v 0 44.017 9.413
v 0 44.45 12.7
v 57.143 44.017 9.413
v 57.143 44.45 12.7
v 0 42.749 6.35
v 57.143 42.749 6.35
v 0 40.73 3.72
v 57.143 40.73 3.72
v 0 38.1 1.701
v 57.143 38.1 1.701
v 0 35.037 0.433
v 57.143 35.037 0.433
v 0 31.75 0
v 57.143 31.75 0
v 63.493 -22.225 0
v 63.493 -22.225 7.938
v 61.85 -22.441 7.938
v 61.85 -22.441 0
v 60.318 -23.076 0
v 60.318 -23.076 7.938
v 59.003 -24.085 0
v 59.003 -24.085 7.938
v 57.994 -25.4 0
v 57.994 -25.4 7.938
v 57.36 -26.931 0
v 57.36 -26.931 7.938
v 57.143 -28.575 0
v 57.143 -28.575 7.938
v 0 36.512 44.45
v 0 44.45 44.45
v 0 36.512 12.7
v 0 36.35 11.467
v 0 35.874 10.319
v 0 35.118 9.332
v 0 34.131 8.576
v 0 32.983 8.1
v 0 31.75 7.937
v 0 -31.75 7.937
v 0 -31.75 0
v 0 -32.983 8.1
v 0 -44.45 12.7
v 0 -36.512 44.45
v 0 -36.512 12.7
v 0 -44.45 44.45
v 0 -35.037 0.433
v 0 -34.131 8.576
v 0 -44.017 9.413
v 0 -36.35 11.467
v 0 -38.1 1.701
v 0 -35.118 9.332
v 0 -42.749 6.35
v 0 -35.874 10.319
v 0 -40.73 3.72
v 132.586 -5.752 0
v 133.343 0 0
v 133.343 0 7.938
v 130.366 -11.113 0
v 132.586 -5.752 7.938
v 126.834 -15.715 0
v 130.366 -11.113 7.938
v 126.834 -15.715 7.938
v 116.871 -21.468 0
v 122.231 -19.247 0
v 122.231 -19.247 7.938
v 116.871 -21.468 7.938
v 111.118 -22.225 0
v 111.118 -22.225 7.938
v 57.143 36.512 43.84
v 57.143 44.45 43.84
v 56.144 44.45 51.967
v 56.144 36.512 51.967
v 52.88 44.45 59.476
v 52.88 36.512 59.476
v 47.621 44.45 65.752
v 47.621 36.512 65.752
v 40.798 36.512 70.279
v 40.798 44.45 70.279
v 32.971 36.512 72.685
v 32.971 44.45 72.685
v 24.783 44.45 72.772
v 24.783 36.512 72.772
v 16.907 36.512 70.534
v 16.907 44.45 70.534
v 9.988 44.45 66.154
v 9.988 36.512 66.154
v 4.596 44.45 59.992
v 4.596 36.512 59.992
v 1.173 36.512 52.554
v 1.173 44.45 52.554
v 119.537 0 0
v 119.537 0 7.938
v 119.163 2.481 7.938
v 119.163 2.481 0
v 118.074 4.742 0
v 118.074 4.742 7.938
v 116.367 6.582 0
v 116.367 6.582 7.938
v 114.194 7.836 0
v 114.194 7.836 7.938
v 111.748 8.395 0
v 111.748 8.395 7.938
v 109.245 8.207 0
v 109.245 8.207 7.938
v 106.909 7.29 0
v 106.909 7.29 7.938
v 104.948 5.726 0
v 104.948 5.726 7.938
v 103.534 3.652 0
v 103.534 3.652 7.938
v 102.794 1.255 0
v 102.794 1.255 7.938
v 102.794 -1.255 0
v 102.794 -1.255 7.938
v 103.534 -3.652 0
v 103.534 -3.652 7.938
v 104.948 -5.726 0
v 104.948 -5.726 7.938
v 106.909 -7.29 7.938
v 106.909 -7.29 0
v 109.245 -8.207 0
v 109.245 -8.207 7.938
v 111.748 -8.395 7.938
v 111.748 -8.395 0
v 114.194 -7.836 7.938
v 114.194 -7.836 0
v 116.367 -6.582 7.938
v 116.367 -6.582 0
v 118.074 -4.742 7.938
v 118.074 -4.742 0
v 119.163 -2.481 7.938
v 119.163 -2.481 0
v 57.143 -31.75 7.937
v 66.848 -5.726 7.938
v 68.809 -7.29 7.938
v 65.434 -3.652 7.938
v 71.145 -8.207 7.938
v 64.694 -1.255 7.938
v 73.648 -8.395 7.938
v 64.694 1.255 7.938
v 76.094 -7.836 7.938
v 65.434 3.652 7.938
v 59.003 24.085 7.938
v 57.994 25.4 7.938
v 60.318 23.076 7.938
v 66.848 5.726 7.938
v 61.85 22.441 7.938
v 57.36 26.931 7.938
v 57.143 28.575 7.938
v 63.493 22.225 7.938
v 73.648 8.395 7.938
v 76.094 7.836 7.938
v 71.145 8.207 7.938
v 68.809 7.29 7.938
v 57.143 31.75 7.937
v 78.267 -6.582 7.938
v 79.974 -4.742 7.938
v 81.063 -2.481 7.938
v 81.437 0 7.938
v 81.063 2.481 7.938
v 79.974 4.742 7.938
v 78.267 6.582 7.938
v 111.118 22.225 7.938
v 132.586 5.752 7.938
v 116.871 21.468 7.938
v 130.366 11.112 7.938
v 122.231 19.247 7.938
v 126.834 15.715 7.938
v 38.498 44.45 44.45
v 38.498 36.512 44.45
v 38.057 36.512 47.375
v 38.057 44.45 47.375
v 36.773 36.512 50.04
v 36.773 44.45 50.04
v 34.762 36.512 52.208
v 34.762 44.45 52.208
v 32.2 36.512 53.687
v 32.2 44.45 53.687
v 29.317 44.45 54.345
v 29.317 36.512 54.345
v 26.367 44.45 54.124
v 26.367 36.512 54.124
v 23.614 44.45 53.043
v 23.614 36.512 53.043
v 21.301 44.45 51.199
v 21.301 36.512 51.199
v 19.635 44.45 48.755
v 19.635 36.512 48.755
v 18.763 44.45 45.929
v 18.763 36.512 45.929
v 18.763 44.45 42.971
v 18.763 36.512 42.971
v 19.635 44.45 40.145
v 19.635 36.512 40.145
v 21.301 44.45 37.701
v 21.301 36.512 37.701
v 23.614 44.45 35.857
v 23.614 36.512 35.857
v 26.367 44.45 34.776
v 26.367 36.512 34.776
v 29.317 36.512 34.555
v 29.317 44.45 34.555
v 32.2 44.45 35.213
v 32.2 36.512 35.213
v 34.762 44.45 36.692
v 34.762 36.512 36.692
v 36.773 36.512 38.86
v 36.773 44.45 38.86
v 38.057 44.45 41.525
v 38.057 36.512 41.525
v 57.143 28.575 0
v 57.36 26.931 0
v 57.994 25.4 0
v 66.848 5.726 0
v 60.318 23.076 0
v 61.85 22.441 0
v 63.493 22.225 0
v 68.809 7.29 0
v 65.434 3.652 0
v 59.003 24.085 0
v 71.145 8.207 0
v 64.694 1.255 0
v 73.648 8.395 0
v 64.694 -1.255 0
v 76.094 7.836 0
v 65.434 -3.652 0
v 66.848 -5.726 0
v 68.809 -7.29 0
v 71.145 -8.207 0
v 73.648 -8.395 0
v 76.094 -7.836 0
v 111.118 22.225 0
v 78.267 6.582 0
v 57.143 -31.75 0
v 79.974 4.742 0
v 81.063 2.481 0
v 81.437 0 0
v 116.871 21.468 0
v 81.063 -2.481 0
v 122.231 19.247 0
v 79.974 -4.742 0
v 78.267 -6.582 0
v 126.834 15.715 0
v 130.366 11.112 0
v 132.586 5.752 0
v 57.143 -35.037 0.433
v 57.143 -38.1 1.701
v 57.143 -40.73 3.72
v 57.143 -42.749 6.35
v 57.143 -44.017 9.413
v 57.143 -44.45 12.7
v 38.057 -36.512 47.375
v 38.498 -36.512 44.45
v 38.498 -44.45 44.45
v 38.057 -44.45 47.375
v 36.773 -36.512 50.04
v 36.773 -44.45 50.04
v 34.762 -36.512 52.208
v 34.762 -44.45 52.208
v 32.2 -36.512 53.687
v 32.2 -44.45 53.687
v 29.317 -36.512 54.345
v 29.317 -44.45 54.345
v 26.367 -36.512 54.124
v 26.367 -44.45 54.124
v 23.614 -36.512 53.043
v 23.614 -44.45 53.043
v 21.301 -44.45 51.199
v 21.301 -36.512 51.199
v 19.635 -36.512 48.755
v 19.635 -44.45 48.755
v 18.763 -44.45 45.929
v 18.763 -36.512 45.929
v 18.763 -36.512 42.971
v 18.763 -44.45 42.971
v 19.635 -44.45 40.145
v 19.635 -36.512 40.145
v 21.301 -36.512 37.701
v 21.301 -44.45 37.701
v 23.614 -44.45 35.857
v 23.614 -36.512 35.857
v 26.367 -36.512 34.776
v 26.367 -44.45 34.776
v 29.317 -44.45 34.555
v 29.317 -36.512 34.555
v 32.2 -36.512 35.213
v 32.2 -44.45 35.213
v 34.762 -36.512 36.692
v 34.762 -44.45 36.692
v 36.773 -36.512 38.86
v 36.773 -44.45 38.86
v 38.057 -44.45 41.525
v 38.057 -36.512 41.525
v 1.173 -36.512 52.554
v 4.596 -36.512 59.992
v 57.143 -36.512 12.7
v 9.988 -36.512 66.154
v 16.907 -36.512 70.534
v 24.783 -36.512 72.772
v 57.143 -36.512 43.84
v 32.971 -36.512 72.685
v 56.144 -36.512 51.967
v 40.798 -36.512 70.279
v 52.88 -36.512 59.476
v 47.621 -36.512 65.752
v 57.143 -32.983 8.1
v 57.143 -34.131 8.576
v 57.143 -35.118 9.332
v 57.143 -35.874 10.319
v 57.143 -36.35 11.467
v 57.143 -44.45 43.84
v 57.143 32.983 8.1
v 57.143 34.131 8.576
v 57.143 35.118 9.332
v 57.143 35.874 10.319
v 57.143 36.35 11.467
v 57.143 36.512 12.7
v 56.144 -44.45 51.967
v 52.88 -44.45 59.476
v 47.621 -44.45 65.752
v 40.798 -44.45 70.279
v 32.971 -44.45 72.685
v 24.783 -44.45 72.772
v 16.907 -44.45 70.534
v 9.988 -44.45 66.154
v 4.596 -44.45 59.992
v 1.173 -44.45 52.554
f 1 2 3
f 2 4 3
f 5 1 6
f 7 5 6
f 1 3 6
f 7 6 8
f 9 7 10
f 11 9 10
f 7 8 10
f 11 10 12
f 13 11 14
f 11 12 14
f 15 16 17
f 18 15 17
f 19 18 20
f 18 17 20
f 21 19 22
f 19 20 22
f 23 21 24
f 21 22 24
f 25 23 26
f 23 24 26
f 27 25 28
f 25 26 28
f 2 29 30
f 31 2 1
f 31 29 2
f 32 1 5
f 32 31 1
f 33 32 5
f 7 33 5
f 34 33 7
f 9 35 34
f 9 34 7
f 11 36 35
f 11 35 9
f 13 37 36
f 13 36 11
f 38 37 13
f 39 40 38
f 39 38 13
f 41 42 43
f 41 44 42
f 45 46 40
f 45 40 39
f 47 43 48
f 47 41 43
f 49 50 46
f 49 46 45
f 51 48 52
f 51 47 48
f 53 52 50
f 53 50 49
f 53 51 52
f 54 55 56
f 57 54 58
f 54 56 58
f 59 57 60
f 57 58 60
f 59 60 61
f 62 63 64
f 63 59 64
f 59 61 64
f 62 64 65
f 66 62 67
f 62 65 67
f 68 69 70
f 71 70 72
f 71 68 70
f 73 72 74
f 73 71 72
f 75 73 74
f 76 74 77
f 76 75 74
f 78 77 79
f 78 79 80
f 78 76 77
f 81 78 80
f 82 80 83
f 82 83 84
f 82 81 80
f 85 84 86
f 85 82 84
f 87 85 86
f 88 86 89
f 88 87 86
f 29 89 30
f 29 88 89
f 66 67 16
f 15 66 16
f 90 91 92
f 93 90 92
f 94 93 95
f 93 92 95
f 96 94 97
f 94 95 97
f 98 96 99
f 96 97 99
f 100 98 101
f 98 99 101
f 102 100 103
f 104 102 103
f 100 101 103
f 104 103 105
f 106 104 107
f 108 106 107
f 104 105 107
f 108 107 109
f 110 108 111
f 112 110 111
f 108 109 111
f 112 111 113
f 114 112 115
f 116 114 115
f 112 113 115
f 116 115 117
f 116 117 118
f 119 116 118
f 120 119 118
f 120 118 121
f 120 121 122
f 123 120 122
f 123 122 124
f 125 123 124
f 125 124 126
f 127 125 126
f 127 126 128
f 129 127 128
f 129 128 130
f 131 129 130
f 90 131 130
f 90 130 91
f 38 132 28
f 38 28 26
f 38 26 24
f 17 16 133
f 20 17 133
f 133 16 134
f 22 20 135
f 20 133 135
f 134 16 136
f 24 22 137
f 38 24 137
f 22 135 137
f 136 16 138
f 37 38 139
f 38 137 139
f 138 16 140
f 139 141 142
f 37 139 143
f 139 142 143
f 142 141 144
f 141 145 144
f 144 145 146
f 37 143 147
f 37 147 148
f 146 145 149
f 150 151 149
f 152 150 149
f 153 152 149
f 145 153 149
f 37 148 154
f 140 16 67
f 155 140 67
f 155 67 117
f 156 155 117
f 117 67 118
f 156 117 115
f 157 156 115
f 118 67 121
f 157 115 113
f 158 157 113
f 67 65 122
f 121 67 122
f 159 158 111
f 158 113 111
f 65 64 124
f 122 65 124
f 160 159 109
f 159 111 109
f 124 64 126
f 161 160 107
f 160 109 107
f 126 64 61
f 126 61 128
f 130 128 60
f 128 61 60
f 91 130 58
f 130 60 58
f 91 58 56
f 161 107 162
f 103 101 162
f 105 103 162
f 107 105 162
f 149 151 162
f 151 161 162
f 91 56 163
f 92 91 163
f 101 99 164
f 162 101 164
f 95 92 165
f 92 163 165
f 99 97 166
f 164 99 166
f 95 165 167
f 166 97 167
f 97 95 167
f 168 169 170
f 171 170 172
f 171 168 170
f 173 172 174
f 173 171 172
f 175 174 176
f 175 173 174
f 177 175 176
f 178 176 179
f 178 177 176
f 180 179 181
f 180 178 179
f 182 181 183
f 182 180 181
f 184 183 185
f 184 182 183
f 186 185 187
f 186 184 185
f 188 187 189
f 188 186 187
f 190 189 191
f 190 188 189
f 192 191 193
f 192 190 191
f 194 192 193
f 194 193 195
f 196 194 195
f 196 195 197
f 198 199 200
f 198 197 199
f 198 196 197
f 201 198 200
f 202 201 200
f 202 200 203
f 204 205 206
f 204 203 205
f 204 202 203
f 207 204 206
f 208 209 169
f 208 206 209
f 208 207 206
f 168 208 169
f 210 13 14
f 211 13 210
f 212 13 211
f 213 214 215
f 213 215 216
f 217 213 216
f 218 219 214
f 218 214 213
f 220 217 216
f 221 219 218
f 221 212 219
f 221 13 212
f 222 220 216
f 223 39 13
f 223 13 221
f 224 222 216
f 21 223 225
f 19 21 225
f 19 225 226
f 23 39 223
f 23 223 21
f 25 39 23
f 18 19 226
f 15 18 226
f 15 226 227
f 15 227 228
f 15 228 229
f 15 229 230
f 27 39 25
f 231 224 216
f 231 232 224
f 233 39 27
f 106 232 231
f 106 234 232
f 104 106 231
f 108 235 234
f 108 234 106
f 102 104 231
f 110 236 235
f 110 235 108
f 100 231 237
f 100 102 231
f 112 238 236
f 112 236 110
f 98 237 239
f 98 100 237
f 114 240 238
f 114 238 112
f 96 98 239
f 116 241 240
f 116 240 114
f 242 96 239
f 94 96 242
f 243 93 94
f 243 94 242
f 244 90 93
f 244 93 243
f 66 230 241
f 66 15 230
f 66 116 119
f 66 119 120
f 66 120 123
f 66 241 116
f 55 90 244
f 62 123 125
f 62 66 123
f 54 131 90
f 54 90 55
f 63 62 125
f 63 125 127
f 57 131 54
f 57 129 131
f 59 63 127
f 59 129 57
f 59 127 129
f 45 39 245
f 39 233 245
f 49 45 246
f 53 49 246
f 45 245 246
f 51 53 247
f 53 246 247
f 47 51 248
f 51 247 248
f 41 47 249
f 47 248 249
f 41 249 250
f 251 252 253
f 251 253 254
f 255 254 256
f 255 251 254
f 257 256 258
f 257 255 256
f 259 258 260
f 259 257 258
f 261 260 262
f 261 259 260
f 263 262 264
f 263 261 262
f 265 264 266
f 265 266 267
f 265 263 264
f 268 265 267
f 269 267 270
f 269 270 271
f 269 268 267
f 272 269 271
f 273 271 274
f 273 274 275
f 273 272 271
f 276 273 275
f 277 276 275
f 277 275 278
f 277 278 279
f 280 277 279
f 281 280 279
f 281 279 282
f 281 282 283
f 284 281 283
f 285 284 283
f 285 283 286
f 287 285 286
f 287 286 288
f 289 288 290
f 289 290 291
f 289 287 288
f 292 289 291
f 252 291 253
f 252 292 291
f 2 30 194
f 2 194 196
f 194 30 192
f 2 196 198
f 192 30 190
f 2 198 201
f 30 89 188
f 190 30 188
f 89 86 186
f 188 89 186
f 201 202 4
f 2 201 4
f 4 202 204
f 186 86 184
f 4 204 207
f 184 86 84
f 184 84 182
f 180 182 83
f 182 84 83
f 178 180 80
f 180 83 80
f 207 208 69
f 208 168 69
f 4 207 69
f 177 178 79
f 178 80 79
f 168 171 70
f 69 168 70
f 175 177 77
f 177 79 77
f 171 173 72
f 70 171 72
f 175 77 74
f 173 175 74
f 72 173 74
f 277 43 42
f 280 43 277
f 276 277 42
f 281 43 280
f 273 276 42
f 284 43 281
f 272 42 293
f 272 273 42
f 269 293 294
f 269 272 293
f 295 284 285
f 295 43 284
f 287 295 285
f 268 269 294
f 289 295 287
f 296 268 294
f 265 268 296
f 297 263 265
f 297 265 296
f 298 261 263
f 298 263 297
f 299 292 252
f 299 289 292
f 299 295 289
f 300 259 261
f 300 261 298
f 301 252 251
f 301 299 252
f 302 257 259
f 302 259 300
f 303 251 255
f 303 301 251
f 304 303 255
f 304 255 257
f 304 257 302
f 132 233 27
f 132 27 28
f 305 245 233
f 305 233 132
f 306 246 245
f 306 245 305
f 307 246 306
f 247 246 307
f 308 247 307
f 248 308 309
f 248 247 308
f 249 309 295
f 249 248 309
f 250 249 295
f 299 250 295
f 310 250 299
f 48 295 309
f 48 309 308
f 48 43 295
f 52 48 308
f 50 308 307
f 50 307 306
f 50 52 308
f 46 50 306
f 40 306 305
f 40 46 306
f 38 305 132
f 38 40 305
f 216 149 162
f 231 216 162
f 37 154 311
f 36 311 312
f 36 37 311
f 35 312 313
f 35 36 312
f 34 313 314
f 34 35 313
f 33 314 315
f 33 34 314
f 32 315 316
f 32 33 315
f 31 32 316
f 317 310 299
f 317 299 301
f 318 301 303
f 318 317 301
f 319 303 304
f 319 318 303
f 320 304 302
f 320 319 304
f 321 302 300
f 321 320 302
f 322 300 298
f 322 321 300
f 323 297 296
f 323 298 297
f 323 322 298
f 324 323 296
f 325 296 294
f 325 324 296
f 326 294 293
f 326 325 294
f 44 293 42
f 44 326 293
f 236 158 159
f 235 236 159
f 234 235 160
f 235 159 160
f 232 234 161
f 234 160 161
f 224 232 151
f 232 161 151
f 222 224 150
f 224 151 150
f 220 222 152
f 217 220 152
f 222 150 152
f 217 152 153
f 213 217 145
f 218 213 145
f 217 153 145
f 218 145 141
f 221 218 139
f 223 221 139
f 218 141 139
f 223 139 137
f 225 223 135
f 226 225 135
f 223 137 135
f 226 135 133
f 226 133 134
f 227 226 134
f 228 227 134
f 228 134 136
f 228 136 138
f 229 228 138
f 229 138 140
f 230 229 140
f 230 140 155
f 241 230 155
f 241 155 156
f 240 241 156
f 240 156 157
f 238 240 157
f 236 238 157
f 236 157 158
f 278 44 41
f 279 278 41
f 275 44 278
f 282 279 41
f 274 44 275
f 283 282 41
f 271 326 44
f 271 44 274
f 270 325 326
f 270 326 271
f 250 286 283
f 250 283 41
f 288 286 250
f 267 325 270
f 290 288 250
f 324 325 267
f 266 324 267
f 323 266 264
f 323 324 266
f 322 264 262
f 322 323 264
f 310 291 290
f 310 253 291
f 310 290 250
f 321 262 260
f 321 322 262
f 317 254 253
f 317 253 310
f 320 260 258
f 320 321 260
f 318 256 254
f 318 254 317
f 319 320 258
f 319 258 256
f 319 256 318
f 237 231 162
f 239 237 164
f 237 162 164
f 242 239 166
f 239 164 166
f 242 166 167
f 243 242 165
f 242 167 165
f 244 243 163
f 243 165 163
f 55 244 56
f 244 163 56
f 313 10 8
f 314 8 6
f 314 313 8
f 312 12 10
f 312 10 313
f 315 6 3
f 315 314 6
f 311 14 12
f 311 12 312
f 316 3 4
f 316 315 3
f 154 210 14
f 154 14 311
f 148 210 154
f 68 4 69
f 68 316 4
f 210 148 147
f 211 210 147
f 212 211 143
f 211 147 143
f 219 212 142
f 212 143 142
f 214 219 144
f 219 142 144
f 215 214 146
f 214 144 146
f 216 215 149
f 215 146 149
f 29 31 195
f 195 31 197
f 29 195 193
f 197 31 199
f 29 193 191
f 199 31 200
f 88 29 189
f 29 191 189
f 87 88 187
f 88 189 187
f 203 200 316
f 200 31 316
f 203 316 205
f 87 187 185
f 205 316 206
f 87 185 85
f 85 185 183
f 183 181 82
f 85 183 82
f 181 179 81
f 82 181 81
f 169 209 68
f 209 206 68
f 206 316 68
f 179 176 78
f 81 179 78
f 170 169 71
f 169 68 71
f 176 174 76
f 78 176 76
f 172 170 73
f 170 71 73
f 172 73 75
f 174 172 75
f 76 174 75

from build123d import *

# Parameters (mm, degrees)
F0_R          = 9.92251
F1_DEPTH      = 44.45
F2_R          = 8.4181384748
F3_DEPTH      = 7.9385
F4_W          = 73.025
F4_H          = 68.6028956175
F5_DEPTH      = 57.1444816201
F5_DEPTH_BACK = 76.201
F6_R          = 12.7
F7_R          = 4.7625


with BuildPart() as f1:
    # F0 (on Front) → F1 (new body, symmetric)
    with BuildSketch(Plane.XZ):
        with BuildLine():
            Line((0, 44.45), (0, 0))
            Line((0, 0), (133.3434816201, 0))
            Line((133.3434816201, 0), (133.3434816201, 7.9375))
            Line((133.3434816201, 7.9375), (57.1434816201, 7.9375))
            Line((57.1434816201, 7.9375), (57.1434816201, 43.8396862105))
            ThreePointArc((57.1434816201, 43.8396862105), (28.880174299, 73.0233703586), (0, 44.45))
        make_face()
        with Locations((28.575, 44.45)):
            Circle(F0_R, mode=Mode.SUBTRACT)
    extrude(amount=F1_DEPTH, both=True)

    # F2 (on face) → F3 (cut, through all)
    with BuildSketch(Plane.XY.offset(7.9375)):
        with BuildLine():
            ThreePointArc((57.1434816201, 28.575), (59.0033535596, 24.0848719395), (63.4934816201, 22.225))
            Line((63.4934816201, 22.225), (111.1184816201, 22.225))
            ThreePointArc((111.1184816201, 22.225), (126.8339299175, 15.7154481263), (133.3434816201, -2.42e-07))
            Line((133.3434816201, -2.42e-07), (133.3434816201, 44.45))
            Line((133.3434816201, 44.45), (57.1434816201, 44.45))
            Line((57.1434816201, 44.45), (57.1434816201, 36.5125))
            Line((57.1434816201, 36.5125), (57.1434816201, 28.575))
        make_face()
        with BuildLine():
            Line((133.3434816201, -44.45), (133.3434816201, -2.42e-07))
            ThreePointArc((133.3434816201, -2.42e-07), (126.8339297464, -15.7154482974), (111.1184816201, -22.225))
            Line((111.1184816201, -22.225), (63.4934816201, -22.225))
            ThreePointArc((63.4934816201, -22.225), (59.0033535596, -24.0848719395), (57.1434816201, -28.575))
            Line((57.1434816201, -28.575), (57.1434816201, -36.5125))
            Line((57.1434816201, -36.5125), (57.1434816201, -44.45))
            Line((57.1434816201, -44.45), (133.3434816201, -44.45))
        make_face()
        with Locations((73.0184816201, 0)):
            Circle(F2_R)
        with Locations((111.1184816201, 0)):
            Circle(F2_R)
    extrude(amount=-F3_DEPTH, mode=Mode.SUBTRACT)

    # F4 (on face) → F5 (cut, two sides)
    with BuildSketch(Plane.YZ.offset(57.1434816201)) as f5_sk:
        with Locations((0, 42.2389478087)):
            Rectangle(F4_W, F4_H)
    extrude(amount=-F5_DEPTH, mode=Mode.SUBTRACT)
    extrude(f5_sk.sketch, amount=F5_DEPTH_BACK, mode=Mode.SUBTRACT)

    # F6
    f6_edges = [f1.edges().sort_by_distance(p)[0] for p in [
        (28.571741, -44.45, 0),
        (28.571741, 44.45, 0),
    ]]
    fillet(f6_edges, radius=F6_R)

    # F7
    f7_edges = [f1.edges().sort_by_distance(p)[0] for p in [
        (28.571741, 36.5125, 7.9375),
        (28.571741, -36.5125, 7.9375),
    ]]
    fillet(f7_edges, radius=F7_R)


solid = f1.part
